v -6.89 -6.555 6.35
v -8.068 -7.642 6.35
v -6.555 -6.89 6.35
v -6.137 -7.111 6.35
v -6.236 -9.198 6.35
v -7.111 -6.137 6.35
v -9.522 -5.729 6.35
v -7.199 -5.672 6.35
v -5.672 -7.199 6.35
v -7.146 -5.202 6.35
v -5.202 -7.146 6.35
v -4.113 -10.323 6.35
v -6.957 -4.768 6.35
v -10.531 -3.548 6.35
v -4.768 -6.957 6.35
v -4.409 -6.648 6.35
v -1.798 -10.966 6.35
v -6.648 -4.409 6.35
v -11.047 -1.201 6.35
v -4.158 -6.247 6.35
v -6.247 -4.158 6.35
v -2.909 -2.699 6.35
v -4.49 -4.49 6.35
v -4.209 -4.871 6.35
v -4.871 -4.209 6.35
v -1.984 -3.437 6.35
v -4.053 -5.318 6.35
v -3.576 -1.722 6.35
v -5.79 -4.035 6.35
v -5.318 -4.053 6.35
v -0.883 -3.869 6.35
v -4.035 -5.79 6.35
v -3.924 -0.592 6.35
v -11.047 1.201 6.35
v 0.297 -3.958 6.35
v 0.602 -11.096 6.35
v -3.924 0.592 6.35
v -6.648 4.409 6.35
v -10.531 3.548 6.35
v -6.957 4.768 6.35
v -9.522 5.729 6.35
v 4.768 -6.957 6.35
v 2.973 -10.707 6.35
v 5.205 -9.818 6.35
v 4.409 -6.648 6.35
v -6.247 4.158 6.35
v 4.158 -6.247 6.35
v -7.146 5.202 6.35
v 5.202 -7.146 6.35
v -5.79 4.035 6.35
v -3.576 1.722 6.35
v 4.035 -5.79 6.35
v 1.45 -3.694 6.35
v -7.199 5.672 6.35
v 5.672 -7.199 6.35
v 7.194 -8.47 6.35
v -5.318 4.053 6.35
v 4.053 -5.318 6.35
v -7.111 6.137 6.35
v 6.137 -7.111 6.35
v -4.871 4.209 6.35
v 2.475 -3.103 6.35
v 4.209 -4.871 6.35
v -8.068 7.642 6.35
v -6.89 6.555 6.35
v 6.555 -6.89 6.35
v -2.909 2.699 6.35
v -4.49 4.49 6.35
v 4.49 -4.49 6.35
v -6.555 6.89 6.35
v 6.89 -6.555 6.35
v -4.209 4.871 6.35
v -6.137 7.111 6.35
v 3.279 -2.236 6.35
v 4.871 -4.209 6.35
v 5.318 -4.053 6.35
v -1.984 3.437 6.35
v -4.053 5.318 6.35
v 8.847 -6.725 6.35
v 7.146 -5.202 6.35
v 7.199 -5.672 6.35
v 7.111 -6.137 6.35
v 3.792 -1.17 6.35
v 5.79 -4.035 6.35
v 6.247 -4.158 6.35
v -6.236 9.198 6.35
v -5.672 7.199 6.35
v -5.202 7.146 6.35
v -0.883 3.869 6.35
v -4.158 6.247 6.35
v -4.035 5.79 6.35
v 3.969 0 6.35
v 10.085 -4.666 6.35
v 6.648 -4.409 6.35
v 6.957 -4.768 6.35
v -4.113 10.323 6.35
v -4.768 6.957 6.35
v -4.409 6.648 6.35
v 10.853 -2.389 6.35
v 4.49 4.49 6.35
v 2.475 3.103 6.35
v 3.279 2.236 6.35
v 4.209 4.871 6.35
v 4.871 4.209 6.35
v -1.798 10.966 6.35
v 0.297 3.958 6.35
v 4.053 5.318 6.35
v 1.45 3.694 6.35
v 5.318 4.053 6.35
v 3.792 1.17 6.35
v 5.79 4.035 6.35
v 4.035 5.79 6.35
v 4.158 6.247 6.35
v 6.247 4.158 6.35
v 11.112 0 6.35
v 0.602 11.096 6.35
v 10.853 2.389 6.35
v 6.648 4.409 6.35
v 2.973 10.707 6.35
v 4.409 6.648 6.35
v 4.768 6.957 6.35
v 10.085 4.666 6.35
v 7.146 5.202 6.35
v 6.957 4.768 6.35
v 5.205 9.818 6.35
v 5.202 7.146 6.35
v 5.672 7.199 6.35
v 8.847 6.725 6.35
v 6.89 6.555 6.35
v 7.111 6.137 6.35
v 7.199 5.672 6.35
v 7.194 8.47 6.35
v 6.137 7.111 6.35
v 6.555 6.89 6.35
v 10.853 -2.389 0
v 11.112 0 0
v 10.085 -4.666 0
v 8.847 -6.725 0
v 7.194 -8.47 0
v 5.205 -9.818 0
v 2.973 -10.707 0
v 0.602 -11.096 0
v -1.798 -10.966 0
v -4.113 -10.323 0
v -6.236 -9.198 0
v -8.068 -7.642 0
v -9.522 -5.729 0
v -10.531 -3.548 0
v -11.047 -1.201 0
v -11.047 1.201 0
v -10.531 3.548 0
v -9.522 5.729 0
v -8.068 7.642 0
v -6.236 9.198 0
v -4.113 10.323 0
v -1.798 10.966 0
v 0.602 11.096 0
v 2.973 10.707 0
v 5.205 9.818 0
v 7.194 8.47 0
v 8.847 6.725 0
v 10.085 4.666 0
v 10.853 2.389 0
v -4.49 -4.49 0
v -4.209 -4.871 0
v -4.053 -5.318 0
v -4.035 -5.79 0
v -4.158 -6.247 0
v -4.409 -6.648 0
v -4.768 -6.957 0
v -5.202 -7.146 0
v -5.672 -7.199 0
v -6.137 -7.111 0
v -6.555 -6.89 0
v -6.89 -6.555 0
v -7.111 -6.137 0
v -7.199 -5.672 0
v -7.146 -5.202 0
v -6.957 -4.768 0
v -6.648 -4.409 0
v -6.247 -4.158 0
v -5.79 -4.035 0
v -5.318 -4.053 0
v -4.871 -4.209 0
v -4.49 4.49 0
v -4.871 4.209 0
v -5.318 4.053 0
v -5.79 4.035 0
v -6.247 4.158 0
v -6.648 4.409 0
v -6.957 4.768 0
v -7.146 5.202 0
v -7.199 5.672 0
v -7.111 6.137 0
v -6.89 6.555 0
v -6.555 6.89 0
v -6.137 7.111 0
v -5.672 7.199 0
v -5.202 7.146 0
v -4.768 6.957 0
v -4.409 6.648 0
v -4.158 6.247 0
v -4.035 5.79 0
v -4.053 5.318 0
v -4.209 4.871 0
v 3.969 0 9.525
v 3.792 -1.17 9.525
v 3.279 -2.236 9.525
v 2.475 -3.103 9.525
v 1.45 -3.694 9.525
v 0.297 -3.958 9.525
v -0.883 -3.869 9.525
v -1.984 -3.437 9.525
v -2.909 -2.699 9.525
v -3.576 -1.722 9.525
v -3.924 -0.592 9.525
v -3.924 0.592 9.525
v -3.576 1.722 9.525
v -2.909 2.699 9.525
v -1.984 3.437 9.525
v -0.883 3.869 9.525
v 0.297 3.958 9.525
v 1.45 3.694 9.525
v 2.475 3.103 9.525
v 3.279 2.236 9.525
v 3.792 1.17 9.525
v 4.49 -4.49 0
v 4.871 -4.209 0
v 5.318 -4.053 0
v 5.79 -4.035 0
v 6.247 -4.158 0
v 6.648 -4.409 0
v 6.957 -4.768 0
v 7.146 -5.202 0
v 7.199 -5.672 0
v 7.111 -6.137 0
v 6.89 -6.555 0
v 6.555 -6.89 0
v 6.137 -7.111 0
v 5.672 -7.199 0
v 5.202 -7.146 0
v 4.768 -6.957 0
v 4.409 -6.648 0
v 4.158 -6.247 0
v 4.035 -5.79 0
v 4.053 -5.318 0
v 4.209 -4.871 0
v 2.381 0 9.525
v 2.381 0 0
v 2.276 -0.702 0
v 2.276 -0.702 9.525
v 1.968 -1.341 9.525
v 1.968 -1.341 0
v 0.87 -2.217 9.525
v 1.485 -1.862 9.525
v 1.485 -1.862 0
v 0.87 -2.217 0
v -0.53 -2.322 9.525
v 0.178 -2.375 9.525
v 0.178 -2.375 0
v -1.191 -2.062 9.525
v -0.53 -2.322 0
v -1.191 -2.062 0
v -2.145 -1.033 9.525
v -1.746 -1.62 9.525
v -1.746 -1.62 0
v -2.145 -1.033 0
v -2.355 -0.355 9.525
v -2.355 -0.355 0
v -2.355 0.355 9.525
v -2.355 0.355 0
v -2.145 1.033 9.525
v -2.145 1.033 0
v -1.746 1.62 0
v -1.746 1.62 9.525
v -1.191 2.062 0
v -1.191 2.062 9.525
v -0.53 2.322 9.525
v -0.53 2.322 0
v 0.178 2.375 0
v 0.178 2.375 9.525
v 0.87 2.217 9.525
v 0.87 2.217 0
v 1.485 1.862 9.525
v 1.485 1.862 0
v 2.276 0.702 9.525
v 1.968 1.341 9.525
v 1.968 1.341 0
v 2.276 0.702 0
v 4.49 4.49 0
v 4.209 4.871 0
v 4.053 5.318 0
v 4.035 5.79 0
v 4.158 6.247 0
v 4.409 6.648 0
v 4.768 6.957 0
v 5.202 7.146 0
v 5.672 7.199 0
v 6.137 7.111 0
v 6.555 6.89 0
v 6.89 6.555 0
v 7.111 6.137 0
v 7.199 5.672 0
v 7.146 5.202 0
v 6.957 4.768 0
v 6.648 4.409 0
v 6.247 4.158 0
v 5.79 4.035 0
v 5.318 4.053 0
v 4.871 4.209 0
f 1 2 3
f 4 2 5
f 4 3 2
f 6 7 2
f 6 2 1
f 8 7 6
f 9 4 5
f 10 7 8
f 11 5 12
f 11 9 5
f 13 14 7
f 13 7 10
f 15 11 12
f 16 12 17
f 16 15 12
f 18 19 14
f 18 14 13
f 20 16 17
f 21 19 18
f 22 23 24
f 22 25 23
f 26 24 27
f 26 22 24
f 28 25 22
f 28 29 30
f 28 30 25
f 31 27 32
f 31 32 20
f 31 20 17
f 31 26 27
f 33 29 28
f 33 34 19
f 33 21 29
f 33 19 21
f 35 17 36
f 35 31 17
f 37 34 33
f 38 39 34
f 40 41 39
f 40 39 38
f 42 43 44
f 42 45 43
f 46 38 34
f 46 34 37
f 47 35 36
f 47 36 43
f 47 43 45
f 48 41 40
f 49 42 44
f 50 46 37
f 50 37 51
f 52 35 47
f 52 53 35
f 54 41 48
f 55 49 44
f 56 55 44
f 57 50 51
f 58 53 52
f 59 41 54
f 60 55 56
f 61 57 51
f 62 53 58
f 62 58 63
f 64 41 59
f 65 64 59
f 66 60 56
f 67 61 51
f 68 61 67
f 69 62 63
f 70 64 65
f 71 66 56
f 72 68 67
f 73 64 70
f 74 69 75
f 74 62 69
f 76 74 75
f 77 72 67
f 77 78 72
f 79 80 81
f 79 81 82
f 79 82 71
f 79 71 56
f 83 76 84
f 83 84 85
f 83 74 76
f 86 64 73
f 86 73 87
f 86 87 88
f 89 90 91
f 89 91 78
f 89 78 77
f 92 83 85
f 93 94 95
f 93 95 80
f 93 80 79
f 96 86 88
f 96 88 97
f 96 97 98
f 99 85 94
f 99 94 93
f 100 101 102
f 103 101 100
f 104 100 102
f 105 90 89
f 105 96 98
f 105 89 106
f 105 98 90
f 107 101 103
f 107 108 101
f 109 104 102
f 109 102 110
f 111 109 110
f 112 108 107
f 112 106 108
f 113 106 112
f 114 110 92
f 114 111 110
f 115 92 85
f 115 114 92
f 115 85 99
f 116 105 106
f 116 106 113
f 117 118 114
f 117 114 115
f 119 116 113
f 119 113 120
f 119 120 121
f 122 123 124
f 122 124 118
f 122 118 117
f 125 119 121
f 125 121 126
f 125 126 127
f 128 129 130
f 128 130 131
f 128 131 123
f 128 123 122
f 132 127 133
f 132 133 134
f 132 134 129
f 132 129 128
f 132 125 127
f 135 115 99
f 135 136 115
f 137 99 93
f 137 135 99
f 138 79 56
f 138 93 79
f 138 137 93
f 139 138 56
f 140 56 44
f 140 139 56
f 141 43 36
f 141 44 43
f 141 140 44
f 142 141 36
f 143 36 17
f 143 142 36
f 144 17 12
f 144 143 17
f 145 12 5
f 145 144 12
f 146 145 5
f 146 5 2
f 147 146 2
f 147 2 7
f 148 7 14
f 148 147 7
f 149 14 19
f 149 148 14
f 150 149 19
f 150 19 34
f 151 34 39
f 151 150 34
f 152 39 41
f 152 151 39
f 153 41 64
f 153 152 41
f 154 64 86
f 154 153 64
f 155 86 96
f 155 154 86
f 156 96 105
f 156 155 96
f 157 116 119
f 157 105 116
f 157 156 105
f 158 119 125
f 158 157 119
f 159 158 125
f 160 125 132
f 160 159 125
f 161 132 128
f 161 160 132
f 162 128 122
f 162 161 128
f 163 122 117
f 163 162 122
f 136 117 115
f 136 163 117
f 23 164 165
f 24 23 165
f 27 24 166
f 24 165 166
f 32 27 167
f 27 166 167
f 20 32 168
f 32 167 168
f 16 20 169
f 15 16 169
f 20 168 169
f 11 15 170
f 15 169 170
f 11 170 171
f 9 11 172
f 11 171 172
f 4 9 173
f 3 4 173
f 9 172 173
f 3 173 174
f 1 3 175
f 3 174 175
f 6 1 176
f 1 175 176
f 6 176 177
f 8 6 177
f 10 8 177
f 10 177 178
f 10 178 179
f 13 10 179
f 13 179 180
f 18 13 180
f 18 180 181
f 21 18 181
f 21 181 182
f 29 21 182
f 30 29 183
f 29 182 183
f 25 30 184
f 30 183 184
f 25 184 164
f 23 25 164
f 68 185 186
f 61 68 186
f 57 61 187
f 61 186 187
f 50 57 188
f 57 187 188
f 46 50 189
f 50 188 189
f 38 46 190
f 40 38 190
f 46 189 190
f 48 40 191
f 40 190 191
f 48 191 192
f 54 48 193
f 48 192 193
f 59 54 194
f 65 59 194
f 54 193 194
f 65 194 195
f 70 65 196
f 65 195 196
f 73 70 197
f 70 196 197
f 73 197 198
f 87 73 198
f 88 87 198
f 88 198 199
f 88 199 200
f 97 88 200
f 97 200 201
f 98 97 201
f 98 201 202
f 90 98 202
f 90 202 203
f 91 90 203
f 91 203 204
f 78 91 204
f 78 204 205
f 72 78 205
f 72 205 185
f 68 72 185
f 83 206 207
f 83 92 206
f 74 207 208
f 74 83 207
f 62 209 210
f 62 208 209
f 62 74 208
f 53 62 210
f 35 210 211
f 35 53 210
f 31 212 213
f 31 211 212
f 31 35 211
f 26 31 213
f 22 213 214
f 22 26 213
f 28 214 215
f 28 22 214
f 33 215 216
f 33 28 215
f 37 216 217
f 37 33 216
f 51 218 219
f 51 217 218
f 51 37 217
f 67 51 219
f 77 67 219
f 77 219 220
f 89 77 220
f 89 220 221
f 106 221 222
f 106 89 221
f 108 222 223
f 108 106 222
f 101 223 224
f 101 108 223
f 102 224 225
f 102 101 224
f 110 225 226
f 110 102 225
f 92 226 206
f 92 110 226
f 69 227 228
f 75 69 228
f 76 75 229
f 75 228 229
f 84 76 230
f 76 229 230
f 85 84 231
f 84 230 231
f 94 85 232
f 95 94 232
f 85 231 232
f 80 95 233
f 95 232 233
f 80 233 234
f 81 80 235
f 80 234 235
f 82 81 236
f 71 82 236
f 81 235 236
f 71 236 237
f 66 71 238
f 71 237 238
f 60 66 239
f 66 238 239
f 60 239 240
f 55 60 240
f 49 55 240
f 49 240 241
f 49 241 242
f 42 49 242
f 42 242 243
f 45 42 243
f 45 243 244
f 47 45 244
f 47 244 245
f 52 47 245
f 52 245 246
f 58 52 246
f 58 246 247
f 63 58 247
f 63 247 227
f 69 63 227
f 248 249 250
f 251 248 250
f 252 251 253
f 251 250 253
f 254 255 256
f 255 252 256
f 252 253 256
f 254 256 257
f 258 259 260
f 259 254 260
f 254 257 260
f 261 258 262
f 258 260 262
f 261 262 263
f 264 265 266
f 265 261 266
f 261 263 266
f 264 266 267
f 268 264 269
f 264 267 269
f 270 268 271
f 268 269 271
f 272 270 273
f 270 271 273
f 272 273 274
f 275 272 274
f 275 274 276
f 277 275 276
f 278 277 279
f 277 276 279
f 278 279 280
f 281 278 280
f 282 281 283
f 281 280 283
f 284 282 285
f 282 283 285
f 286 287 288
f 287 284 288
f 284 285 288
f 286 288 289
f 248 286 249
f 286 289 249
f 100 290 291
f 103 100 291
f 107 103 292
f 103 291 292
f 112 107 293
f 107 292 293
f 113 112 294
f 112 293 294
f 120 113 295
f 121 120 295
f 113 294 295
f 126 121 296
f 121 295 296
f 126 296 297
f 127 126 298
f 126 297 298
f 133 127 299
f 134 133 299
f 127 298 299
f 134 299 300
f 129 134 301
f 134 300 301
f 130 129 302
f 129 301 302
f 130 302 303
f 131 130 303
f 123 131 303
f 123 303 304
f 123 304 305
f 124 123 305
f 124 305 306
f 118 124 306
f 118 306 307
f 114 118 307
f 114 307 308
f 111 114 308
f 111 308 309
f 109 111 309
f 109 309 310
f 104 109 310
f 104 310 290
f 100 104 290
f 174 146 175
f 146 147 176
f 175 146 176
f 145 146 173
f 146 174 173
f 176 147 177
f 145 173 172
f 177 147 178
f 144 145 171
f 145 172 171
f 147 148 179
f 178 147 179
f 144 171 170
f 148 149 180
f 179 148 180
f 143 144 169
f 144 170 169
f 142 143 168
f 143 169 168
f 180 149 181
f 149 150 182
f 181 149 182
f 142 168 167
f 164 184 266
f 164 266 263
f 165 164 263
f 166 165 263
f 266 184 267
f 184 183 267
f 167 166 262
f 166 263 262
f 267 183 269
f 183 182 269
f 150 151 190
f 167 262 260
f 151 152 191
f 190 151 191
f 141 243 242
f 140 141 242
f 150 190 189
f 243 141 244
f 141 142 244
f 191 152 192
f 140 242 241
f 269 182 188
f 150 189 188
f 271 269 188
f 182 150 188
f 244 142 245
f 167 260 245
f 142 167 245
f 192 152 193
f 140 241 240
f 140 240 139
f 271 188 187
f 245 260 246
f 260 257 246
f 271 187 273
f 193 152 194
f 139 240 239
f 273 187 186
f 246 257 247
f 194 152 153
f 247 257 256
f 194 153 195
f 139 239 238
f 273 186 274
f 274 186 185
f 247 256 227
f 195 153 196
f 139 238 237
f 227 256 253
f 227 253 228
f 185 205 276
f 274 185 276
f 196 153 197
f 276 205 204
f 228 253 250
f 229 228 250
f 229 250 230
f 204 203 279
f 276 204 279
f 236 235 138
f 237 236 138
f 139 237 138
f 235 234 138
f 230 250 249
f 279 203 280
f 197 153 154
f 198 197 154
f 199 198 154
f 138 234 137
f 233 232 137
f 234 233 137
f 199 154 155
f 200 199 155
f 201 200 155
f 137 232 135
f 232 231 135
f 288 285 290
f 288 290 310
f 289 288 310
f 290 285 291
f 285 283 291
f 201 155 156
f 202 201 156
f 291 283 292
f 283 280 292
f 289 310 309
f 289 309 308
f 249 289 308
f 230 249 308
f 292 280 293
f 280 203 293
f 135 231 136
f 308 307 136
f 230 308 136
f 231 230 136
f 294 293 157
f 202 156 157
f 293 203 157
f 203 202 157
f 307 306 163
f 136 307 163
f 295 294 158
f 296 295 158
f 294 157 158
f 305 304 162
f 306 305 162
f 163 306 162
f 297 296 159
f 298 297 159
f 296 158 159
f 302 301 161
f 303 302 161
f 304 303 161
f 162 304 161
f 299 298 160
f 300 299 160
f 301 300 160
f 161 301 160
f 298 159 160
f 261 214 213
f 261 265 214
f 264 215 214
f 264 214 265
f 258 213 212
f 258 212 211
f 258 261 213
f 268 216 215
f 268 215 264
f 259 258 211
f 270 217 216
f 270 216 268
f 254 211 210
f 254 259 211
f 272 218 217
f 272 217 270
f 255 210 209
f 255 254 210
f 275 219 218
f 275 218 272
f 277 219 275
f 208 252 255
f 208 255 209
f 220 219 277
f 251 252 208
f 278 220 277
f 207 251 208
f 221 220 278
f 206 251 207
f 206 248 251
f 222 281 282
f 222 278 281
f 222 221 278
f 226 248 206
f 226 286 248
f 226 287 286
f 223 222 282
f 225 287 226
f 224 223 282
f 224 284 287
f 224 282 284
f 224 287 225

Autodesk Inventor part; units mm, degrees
ref_plane "YZ Plane" through (0, 0, 0) normal (1, 0, 0) x (0, 1, 0)
ref_plane "XZ Plane" through (0, 0, 0) normal (0, 1, 0) x (-1, 0, 0)
ref_plane "XY Plane" through (0, 0, 0) normal (0, 0, 1) x (1, 0, 0)
sketch "Sketch1" plane through (0, 0, 0) normal (0, 0, 1) x (1, 0, 0)
  circle A0 centre (0, 0) radius 11.1125
  circle A1 centre (0, 0) radius 2.3813
  circle A2 centre (0, 7.9375) radius 1.5875
  circle A3 centre (-7.9375, 0) radius 1.5875
  circle A4 centre (0, -7.9375) radius 1.5875
  circle A5 centre (7.9375, 0) radius 1.5875
  dimension "d0" = 22.225
  dimension "d1" = 4.7625
  dimension "d2" = 3.175
  dimension "d3" = 7.9375
  dimension "d6" = 360
extrude "Extrusion1" add sketch "Sketch1" along normal blind 6.35
sketch "Sketch2" plane through (0, 0, 6.35) normal (0, 0, 1) x (1, 0, 0)
  circle A0 centre (0, 0) radius 2.3813 projected
  circle A1 centre (0, 0) radius 11.1125 projected
  circle A2 centre (0, 0) radius 3.9688
  circle A3 centre (0, 0) radius 2.3813
  dimension "d10" = 7.9375
extrude "Extrusion2" add sketch "Sketch2" along normal blind 3.175 contours A2
sketch "Sketch4" plane through (0, 0, 6.35) normal (0, 0, 1) x (1, 0, 0)
  circle A0 centre (0, 0) radius 3.9687 projected
  circle A1 centre (7.9375, 0) radius 1.5875 projected
  circle A2 centre (0, -7.9375) radius 1.5875 projected
  circle A3 centre (-7.9375, 0) radius 1.5875 projected
  circle A4 centre (0, 7.9375) radius 1.5875 projected
  circle A5 centre (0, 7.9375) radius 1.5875
  circle A6 centre (-7.9375, 0) radius 1.5875
  circle A7 centre (0, -7.9375) radius 1.5875
  circle A8 centre (7.9375, 0) radius 1.5875
  dimension "d22" = 360
extrude "Extrusion3" add sketch "Sketch4" against normal blind 6.35 contours A1 | A2 | A3 | A4
sketch "Sketch5" plane through (0, 0, 6.35) normal (0, 0, 1) x (1, 0, 0)
  circle A0 centre (0, 0) radius 3.9687 projected
  circle A1 centre (0, 7.9375) radius 1.5875
  dimension "d26" = 3.175
  dimension "d27" = 7.9375
hole "Hole2" at (0, 7.9375, 6.35) direction (0, 0, -1) diameter 3.175 end through all
pattern_circular "Circular Pattern1" count 8 over 360 about axis through (0, 0, 0) along (0, 0, 1) of "Hole2"
sketch "Sketch6" plane through (0, 0, 6.35) normal (0, 0, 1) x (1, 0, 0)
  circle A0 centre (7.9375, 0) radius 1.5875 projected
  circle A1 centre (0, -7.9375) radius 1.5875 projected
  circle A2 centre (-7.9375, 0) radius 1.5875 projected
  circle A3 centre (0, 7.9375) radius 1.5875 projected
  circle A4 centre (0, 0) radius 3.9687 projected
  circle A5 centre (0, 7.9375) radius 1.5875
  circle A6 centre (-7.9375, 0) radius 1.5875
  circle A7 centre (0, -7.9375) radius 1.5875
  circle A8 centre (7.9375, 0) radius 1.5875
  dimension "d40" = 360
extrude "Extrusion4" add sketch "Sketch6" against normal blind 6.35 contours A0 | A1 | A2 | A3
properties part number "axle hub"
